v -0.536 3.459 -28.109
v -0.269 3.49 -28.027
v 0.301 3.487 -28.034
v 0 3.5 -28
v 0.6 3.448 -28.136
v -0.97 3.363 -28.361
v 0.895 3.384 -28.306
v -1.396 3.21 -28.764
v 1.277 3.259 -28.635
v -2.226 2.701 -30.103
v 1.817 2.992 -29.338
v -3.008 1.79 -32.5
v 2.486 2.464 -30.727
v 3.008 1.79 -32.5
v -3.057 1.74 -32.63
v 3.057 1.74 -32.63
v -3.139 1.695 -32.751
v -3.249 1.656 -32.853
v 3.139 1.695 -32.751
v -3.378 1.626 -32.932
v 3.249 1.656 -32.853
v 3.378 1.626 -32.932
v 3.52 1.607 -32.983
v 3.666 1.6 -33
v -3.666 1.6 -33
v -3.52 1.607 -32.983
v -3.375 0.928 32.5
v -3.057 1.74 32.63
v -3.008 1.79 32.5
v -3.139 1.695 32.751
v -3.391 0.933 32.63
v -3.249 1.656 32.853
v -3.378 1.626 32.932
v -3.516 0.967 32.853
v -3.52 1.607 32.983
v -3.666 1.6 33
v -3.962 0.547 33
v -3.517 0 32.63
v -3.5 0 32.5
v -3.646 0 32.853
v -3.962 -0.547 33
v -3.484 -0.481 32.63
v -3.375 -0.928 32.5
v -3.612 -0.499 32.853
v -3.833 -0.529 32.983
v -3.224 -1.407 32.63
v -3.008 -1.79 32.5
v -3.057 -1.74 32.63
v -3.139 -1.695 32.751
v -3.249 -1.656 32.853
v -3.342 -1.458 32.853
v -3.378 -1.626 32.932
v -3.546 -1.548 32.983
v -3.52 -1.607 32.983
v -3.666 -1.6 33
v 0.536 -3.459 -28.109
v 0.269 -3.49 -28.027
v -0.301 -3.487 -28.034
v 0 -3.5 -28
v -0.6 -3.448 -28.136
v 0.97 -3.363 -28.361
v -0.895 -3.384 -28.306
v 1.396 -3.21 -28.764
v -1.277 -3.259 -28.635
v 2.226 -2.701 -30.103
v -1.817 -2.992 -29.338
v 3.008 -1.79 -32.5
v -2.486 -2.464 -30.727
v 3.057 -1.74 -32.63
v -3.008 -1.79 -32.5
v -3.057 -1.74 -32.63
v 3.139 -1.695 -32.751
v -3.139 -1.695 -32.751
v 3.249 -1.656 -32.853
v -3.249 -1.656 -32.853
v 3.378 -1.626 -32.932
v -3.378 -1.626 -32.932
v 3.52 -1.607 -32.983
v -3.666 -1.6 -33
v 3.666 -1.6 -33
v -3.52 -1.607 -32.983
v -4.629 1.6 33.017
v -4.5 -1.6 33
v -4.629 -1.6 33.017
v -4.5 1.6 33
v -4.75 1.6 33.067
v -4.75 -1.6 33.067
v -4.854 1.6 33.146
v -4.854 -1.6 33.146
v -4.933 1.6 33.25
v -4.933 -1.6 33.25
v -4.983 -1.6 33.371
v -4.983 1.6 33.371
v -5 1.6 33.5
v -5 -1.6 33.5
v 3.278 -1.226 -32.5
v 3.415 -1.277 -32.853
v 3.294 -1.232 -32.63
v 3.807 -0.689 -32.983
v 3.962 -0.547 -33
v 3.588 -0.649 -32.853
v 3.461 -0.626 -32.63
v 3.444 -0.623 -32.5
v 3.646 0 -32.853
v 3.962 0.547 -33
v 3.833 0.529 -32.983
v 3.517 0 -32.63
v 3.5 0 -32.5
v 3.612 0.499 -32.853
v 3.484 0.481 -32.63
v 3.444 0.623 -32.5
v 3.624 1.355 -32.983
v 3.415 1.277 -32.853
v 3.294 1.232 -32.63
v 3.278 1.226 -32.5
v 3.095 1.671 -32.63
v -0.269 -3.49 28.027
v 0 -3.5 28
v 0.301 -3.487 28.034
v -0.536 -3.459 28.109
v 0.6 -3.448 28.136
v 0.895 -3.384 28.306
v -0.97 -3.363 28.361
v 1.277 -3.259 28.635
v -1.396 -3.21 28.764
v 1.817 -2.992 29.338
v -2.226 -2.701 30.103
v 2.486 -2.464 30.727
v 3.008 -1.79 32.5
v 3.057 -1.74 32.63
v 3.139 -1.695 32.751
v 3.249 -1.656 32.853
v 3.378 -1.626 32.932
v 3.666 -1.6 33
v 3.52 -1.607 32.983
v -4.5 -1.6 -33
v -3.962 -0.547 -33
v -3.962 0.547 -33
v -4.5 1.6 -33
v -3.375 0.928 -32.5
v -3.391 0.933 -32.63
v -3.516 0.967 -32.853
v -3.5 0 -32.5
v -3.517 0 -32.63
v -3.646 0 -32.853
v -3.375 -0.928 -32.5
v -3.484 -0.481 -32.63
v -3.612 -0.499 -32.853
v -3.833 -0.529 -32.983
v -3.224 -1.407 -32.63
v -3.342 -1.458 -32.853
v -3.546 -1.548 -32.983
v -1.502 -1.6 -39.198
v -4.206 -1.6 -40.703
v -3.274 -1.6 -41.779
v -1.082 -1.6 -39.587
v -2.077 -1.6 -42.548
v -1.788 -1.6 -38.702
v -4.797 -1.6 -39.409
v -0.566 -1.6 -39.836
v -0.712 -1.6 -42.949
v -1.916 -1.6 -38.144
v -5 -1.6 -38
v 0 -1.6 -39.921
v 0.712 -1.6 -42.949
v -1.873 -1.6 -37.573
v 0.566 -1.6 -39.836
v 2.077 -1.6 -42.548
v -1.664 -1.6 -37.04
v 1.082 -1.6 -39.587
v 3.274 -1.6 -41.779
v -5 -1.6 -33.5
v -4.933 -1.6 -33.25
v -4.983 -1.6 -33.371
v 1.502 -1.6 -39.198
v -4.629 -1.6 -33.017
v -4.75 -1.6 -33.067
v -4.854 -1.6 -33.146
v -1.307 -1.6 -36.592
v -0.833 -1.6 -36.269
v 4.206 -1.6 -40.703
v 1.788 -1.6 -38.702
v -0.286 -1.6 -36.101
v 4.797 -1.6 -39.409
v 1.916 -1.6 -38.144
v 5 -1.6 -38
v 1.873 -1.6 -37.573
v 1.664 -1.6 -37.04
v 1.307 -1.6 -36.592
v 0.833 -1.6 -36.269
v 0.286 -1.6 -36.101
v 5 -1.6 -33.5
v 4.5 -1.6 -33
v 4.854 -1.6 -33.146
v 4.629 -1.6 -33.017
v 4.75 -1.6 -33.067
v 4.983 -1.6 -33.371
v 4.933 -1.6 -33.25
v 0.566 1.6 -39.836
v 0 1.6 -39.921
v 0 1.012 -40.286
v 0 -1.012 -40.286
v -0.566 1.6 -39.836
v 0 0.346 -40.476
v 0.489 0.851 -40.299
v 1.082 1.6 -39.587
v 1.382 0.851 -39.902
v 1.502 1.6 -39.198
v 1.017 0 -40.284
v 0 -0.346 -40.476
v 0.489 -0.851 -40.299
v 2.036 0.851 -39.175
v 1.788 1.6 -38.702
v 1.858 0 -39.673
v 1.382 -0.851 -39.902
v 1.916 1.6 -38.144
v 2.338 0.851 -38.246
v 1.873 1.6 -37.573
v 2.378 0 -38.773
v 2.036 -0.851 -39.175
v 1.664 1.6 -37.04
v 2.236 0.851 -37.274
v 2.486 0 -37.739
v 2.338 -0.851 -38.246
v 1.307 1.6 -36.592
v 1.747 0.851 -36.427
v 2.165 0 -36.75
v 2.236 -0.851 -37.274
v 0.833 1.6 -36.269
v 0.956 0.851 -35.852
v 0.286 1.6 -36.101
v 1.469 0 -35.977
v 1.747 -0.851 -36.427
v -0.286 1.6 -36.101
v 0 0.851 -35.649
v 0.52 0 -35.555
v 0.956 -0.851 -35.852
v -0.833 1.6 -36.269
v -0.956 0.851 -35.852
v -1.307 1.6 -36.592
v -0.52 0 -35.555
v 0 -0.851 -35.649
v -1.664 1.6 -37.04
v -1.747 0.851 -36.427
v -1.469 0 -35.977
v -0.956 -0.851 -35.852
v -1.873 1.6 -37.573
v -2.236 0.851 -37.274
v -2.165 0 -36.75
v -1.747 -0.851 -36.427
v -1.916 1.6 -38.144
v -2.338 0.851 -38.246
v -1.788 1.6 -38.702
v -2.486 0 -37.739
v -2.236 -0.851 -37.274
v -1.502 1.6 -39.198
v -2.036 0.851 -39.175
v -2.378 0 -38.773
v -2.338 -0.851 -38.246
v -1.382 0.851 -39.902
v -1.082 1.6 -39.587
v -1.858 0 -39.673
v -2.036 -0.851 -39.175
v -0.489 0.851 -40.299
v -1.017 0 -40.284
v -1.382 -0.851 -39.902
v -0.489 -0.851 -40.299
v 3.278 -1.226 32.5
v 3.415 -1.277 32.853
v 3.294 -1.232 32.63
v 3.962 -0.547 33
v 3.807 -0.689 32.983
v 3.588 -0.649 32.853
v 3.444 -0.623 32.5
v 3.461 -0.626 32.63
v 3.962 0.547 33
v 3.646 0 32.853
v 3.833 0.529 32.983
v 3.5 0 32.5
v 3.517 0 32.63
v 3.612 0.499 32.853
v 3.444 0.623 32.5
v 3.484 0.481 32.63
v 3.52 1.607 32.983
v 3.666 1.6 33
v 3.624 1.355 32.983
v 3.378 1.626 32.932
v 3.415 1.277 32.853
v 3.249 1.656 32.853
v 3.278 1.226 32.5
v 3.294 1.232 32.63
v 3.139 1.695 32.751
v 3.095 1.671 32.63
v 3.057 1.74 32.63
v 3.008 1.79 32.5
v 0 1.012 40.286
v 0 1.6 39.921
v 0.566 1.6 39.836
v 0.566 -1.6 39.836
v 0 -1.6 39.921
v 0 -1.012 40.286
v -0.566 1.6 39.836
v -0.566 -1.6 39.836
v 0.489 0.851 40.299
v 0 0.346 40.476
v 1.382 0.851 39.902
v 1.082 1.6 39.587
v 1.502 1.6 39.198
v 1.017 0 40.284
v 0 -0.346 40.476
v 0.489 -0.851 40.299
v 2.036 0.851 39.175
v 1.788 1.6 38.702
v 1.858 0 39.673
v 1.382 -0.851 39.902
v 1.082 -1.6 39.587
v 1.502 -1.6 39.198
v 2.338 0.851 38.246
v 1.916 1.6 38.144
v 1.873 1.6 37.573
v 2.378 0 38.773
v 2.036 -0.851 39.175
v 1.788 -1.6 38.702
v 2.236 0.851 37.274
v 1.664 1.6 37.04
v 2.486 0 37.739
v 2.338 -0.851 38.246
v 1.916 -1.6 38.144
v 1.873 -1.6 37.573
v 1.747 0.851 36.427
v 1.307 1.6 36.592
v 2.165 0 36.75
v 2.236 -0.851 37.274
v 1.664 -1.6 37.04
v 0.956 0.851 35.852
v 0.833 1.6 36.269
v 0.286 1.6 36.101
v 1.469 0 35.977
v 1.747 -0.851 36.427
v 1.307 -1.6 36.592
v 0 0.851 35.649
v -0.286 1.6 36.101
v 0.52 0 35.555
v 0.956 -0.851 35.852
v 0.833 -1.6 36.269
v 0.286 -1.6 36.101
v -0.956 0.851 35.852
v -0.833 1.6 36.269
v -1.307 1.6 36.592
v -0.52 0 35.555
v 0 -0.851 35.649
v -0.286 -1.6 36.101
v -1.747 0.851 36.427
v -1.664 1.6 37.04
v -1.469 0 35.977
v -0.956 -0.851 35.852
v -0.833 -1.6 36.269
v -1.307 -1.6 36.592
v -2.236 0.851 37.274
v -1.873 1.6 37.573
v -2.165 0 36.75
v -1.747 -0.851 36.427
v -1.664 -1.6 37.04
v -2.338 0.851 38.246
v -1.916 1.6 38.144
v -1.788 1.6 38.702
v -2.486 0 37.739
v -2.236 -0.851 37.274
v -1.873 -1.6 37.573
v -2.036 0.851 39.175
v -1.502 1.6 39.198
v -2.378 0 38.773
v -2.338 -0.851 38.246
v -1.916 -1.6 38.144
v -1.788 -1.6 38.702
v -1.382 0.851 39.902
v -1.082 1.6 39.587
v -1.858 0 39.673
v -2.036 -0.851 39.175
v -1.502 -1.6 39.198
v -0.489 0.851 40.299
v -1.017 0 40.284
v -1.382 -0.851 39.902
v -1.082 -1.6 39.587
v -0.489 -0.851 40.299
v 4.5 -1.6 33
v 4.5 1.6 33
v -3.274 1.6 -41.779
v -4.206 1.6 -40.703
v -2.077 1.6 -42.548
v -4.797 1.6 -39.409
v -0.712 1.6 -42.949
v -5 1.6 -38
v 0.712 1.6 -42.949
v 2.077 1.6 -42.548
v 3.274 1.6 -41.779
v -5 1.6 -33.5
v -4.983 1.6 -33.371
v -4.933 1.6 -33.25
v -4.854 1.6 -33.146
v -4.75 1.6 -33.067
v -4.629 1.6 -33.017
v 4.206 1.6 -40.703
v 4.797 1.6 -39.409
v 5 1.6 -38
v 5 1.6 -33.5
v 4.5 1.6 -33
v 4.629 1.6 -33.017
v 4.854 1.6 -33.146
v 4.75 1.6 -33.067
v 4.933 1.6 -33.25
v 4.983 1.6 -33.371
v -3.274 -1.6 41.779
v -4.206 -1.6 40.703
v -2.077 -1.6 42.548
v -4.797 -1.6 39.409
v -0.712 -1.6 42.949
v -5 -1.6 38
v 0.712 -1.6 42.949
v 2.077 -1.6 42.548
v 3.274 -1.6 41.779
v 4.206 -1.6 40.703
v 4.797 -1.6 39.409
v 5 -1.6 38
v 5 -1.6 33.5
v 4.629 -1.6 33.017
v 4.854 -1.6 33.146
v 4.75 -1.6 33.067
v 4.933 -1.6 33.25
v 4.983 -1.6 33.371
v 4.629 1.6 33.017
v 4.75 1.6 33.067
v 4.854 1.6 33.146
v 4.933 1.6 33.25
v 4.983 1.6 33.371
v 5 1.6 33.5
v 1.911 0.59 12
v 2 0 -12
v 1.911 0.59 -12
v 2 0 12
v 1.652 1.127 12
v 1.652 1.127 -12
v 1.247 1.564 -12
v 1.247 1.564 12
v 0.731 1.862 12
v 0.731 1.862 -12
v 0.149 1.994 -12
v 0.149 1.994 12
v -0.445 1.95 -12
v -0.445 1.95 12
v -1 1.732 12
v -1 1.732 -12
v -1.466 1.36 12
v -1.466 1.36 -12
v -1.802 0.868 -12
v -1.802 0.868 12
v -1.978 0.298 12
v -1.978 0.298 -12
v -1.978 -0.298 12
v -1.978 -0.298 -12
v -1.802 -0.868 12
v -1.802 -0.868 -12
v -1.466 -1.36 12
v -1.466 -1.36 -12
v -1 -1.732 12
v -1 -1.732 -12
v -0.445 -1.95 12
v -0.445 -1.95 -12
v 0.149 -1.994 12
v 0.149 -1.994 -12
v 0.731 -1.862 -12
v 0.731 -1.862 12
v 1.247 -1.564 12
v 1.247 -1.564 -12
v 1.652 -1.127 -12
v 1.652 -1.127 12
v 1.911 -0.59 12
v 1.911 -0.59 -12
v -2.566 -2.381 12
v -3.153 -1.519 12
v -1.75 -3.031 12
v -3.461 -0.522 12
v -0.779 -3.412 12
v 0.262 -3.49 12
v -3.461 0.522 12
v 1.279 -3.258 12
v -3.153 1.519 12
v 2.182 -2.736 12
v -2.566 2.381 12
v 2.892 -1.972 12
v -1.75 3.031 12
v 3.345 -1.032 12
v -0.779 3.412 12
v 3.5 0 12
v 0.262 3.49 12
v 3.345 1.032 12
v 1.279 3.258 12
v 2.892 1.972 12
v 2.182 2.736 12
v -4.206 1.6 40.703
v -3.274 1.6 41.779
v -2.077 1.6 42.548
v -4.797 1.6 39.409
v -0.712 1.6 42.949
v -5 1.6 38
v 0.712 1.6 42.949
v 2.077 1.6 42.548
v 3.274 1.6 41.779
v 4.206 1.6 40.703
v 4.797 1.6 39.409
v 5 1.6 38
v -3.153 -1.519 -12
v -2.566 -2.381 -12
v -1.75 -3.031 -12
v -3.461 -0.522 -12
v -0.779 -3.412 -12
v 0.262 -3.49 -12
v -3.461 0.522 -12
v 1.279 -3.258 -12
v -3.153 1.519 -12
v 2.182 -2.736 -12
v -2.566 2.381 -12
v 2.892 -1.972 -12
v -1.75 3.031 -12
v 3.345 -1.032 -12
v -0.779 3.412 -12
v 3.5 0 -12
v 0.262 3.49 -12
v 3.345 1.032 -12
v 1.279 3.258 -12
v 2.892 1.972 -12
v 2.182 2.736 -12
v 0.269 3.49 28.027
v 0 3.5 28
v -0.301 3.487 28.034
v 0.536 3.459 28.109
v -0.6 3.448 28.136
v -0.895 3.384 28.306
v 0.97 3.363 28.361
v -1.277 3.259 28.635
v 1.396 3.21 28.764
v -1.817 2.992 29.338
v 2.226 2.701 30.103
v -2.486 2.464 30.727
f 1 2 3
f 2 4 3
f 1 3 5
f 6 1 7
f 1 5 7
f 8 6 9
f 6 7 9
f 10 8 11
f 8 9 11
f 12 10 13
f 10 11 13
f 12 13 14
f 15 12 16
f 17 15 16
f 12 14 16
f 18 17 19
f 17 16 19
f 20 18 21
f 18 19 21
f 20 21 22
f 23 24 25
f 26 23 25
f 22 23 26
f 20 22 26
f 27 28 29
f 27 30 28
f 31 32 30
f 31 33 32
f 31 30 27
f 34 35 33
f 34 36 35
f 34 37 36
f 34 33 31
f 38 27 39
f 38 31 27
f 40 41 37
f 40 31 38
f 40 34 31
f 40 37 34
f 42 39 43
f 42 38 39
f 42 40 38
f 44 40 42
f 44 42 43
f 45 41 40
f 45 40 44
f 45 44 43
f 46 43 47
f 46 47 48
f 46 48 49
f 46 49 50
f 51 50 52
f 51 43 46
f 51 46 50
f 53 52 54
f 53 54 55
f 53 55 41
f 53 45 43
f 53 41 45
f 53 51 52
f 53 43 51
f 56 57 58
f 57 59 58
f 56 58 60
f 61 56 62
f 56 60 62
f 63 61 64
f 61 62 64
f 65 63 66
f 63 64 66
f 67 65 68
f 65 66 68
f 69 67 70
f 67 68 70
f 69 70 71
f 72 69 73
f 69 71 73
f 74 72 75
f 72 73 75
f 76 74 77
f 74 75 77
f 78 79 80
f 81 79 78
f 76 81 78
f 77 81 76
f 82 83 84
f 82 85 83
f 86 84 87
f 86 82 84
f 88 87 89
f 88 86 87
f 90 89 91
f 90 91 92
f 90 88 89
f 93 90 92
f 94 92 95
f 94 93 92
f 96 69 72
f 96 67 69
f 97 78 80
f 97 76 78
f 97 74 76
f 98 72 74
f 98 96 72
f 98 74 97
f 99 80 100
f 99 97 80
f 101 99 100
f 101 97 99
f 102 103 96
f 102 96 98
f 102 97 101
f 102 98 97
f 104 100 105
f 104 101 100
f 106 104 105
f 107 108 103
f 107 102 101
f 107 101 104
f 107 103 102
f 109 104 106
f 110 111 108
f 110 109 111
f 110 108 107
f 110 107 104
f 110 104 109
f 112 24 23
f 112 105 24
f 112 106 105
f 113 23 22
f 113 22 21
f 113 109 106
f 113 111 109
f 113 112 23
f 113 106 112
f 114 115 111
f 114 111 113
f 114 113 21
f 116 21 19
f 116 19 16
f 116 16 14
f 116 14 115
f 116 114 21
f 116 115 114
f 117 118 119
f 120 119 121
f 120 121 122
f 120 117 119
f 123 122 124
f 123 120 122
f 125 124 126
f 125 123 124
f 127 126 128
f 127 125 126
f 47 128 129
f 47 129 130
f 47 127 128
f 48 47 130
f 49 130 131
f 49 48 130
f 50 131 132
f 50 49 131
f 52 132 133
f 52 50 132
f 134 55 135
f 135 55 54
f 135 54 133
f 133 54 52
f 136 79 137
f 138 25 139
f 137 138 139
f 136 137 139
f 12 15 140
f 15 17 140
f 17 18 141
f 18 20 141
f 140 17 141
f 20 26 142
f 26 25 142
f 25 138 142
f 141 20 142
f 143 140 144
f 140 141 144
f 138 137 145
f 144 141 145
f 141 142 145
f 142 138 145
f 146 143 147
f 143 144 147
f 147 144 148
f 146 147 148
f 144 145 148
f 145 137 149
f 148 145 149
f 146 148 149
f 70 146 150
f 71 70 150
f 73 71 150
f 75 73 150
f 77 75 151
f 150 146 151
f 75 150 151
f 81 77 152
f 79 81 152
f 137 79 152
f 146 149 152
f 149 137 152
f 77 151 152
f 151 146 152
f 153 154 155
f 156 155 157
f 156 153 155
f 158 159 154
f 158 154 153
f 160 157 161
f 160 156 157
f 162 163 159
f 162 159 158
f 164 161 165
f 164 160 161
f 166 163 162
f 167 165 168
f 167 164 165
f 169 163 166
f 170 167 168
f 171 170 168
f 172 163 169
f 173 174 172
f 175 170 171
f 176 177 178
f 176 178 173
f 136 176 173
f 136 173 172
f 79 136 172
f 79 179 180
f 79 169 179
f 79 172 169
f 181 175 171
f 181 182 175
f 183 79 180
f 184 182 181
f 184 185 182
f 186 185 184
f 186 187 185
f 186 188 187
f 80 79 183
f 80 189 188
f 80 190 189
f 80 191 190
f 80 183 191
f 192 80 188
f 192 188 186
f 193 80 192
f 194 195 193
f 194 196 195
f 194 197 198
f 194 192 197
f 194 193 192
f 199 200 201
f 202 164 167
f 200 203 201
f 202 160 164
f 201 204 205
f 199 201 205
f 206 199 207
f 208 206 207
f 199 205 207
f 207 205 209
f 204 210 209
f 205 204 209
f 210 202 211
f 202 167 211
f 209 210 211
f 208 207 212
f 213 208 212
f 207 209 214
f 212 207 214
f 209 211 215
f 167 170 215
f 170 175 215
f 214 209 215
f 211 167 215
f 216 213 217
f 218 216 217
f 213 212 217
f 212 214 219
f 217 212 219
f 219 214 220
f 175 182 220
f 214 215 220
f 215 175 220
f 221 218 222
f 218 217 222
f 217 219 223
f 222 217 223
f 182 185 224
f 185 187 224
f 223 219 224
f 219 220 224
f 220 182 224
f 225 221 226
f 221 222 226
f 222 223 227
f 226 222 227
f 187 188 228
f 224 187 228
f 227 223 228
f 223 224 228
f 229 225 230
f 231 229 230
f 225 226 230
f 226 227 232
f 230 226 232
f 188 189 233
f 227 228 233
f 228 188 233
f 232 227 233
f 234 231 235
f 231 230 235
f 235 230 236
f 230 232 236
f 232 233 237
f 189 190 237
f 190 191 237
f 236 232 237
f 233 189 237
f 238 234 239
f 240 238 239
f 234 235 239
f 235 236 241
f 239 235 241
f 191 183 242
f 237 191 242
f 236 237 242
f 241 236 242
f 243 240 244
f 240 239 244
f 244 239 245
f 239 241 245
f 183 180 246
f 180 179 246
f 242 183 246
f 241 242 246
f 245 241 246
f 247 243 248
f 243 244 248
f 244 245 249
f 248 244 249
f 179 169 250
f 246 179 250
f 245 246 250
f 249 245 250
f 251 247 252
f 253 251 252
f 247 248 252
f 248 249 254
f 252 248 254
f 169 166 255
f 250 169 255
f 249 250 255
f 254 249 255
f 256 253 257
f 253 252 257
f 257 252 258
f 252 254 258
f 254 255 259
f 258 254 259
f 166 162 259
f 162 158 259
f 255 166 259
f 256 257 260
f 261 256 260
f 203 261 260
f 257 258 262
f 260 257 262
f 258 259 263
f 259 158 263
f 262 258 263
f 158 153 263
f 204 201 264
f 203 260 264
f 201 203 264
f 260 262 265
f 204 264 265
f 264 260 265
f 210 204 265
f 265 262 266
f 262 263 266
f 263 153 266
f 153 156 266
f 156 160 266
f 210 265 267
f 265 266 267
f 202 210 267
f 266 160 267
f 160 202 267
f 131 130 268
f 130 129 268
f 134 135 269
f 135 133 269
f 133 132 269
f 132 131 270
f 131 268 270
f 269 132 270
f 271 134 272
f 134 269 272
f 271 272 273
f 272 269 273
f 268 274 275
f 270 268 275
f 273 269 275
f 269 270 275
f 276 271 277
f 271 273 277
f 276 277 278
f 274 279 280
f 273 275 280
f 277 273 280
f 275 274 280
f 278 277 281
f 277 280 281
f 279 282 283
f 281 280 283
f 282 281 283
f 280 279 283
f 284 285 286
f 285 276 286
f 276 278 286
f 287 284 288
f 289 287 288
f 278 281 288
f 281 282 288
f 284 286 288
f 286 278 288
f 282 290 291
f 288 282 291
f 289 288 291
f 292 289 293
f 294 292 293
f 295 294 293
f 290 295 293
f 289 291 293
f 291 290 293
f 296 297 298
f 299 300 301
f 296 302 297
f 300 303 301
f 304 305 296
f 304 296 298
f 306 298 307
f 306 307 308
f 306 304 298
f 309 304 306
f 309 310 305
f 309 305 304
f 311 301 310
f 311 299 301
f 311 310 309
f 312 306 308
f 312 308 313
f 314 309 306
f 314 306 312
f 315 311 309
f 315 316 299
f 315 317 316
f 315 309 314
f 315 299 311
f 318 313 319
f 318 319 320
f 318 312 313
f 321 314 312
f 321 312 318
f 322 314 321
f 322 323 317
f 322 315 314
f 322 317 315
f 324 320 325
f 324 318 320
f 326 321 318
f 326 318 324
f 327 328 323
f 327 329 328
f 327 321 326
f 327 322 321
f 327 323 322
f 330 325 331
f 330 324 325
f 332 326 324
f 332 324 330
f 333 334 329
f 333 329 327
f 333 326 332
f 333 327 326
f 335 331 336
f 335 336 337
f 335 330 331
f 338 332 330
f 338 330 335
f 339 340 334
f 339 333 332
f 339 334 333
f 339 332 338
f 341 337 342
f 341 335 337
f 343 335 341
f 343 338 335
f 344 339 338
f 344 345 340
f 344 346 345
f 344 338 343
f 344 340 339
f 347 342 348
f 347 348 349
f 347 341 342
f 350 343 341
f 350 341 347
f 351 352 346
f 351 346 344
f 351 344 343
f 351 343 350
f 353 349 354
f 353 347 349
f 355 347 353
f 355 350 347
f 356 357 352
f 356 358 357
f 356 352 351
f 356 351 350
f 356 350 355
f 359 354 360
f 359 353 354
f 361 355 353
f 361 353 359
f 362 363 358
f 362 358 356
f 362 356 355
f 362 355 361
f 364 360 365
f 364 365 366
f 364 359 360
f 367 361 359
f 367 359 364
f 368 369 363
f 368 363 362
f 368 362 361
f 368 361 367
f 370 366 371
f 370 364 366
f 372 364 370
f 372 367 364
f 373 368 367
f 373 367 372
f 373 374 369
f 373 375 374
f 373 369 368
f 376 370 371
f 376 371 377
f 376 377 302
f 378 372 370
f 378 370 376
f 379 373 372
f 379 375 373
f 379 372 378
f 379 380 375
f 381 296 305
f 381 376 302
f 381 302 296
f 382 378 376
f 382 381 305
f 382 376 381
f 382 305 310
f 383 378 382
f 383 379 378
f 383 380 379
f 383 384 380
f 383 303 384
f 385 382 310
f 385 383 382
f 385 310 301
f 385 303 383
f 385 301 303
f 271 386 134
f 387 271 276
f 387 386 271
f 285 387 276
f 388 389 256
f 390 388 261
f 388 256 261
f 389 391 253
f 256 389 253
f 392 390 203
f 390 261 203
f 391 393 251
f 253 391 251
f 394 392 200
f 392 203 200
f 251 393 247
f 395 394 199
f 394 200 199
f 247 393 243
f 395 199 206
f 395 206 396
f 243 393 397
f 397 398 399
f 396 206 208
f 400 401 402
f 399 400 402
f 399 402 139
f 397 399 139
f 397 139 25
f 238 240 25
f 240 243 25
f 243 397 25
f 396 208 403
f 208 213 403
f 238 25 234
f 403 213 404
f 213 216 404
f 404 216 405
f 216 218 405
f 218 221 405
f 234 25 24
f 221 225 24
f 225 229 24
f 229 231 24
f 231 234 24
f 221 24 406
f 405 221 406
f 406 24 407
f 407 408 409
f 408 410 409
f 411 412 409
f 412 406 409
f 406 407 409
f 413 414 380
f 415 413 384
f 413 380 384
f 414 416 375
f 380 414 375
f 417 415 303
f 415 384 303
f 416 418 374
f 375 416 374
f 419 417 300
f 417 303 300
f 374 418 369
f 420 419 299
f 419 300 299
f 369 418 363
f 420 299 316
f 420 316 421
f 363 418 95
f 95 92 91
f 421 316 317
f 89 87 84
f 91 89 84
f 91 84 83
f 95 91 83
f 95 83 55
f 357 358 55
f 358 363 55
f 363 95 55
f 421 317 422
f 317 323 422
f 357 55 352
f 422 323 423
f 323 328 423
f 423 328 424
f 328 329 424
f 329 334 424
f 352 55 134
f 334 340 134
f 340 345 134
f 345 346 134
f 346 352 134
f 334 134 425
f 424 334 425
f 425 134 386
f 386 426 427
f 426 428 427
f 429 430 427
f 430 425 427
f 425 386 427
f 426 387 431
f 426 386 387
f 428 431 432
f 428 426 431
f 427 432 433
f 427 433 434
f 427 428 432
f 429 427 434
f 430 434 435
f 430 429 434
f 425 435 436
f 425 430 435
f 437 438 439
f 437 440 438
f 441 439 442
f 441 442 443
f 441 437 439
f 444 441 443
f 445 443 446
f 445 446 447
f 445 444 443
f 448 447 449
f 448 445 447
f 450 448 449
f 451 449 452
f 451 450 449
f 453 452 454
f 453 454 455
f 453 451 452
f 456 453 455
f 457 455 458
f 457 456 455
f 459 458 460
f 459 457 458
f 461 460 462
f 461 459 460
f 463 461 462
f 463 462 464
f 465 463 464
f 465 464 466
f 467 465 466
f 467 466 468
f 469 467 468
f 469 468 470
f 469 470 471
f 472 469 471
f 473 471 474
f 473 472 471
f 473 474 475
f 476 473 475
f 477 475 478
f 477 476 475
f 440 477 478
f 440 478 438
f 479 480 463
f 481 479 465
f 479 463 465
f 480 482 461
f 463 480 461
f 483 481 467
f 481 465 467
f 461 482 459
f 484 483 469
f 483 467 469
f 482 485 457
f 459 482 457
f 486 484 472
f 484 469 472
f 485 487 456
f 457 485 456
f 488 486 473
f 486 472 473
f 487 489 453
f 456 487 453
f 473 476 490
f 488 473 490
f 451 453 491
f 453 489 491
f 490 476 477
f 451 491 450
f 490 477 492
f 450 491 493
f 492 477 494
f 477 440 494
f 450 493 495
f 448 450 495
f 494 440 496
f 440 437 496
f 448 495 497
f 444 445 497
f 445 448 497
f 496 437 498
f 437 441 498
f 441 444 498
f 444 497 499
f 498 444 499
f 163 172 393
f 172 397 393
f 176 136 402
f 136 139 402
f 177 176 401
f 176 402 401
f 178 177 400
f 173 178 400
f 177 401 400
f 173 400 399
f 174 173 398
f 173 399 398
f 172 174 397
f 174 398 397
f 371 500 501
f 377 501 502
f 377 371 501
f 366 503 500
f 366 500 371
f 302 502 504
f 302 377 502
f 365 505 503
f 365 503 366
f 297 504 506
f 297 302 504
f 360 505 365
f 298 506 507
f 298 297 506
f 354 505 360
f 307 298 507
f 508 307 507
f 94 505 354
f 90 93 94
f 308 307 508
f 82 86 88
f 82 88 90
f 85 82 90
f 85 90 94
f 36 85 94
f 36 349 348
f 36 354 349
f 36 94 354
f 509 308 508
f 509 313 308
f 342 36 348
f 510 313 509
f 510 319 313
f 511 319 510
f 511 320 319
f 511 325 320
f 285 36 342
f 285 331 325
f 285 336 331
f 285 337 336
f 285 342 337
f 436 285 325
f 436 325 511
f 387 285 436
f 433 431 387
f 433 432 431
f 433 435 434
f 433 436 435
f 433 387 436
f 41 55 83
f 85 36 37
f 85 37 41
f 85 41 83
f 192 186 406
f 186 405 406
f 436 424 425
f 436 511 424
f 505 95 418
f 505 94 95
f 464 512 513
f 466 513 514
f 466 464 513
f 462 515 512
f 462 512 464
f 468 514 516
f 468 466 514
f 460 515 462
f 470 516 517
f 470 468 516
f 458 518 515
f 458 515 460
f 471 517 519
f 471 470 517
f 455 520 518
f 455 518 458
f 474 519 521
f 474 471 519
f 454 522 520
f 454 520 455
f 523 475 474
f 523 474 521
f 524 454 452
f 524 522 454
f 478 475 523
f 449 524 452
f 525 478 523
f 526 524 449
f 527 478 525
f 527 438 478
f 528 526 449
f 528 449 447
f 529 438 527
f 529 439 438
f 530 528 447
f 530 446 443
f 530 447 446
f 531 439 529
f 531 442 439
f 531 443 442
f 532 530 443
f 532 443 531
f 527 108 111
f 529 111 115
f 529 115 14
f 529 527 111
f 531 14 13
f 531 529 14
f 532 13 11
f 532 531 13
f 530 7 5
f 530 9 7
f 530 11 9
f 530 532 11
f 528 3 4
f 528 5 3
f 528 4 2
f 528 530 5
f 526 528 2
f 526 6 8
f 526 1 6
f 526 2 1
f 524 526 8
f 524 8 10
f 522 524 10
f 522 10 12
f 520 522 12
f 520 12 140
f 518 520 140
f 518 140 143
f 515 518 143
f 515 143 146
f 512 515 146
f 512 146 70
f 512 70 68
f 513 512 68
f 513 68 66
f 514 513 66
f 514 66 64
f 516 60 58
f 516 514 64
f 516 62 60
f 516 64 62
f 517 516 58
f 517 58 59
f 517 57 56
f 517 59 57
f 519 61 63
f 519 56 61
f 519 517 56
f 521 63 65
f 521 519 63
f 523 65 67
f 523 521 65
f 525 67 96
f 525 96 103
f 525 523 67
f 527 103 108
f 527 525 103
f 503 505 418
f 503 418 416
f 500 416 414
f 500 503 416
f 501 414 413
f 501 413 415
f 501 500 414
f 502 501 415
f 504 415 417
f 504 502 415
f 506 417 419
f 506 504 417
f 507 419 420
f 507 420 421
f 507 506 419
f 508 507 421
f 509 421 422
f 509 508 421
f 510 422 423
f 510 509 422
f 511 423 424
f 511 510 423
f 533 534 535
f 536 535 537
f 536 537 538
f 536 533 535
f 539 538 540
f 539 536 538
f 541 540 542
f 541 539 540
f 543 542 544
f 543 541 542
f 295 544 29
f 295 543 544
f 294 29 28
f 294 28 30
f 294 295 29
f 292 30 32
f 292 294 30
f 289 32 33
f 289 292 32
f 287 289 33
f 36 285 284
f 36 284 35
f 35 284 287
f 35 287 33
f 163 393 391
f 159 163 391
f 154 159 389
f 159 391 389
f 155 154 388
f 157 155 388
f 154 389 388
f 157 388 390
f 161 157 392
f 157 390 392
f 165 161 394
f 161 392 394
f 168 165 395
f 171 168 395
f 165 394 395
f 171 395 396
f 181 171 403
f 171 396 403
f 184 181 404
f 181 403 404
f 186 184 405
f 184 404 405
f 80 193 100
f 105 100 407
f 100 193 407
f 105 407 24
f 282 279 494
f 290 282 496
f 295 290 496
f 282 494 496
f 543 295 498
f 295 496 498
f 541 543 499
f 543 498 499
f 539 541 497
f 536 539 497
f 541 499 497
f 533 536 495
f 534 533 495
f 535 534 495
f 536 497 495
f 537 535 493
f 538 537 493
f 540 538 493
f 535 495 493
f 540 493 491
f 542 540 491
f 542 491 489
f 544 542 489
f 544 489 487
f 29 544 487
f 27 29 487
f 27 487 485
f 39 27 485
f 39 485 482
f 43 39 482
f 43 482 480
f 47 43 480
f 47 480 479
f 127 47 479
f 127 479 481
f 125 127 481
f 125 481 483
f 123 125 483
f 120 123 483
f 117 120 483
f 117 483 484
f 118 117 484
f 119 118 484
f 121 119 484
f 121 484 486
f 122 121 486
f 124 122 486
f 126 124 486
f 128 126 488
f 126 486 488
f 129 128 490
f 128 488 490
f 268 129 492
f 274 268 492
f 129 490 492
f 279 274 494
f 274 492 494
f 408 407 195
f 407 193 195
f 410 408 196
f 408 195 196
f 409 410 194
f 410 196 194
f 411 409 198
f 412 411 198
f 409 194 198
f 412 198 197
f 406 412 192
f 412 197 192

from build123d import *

# Parameters (mm, degrees)
SKETCH1_R                  = 2
SCREW_SECTION_DEPTH        = 12
SKETCH2_R                  = 3.5
BAR_SECTION_DEPTH          = 21
MOUNT_SECTION_DEPTH        = 1.6
BAR_TAPER_DEPTH            = 6
MOUNT_FILLET_R             = 0.5
MOUNT_FILLET_OF_MIRROR_2_R = 0.5


with BuildPart() as part:
    # Sketch1 → Screw Section (new body)
    with BuildSketch(Plane.XY):
        Circle(SKETCH1_R)
    screw_section = extrude(amount=SCREW_SECTION_DEPTH)

    # Sketch2 → Bar Section (add)
    with BuildSketch(Plane.XY.offset(12)):
        Circle(SKETCH2_R)
    bar_section = extrude(amount=BAR_SECTION_DEPTH)

    # Sketch3 → Mount Section (add, symmetric)
    with BuildSketch(Plane(origin=(0, 0, 0), x_dir=(1, 0, 0), z_dir=(0, 1, 0))):
        with BuildLine():
            Line((5, -33), (-5, -33))
            Line((-5, -33), (-5, -38))
            ThreePointArc((-5, -38), (0, -43), (5, -38))
            Line((5, -38), (5, -33))
        make_face()
    mount_section = extrude(amount=MOUNT_SECTION_DEPTH, both=True)

    # Sketch4 → Bar Taper (cut, symmetric)
    with BuildSketch(Plane(origin=(0, 0, 0), x_dir=(0, 0, -1), z_dir=(1, 0, 0))):
        Polygon((-28, -3.5), (-33, -1.6), (-33, -3.5), align=None)
        Polygon((-28, 3.5), (-33, 1.6), (-33, 3.5), align=None)
    bar_taper = extrude(amount=BAR_TAPER_DEPTH, both=True, mode=Mode.SUBTRACT)

    # Mount Fillet
    mount_fillet_edges = [part.edges().sort_by_distance(p)[0] for p in [
        (-5, 0, 33),
        (3.401842713, -0.823083322, 33),
        (-3.5, 0, 33),
        (5, 0, 33),
    ]]
    fillet(mount_fillet_edges, radius=MOUNT_FILLET_R)

    # Sketch6 → Ball Hole (revolve, cut)
    with BuildSketch(Plane(origin=(0, 0, 0), x_dir=(0, 0, -1), z_dir=(1, 0, 0))):
        with BuildLine():
            Line((-39.920937271, -1.6), (-38, -1.6))
            Line((-38, -1.6), (-38, 1.6))
            Line((-38, 1.6), (-39.920937271, 1.6))
            ThreePointArc((-39.920937271, 1.6), (-40.5, 0), (-39.920937271, -1.6))
        make_face()
    ball_hole = revolve(axis=Axis((0, -1.6, 38), (0, 1, 0)), mode=Mode.SUBTRACT)

    # Mirror 2: Screw Section, Bar Section, Mount Section, Bar Taper, Ball Hole across plane
    add(screw_section.mirror(Plane.XY))
    add(bar_section.mirror(Plane.XY))
    add(mount_section.mirror(Plane.XY))
    add(bar_taper.mirror(Plane.XY), mode=Mode.SUBTRACT)
    add(ball_hole.mirror(Plane.XY), mode=Mode.SUBTRACT)

    # Mount Fillet of Mirror 2
    mount_fillet_of_mirror_2_edges = [part.edges().sort_by_distance(p)[0] for p in [
        (-5, 0, -33),
        (3.401842713, -0.823083322, -33),
        (-3.5, 0, -33),
        (5, 0, -33),
    ]]
    fillet(mount_fillet_of_mirror_2_edges, radius=MOUNT_FILLET_OF_MIRROR_2_R)


solid = part.part
